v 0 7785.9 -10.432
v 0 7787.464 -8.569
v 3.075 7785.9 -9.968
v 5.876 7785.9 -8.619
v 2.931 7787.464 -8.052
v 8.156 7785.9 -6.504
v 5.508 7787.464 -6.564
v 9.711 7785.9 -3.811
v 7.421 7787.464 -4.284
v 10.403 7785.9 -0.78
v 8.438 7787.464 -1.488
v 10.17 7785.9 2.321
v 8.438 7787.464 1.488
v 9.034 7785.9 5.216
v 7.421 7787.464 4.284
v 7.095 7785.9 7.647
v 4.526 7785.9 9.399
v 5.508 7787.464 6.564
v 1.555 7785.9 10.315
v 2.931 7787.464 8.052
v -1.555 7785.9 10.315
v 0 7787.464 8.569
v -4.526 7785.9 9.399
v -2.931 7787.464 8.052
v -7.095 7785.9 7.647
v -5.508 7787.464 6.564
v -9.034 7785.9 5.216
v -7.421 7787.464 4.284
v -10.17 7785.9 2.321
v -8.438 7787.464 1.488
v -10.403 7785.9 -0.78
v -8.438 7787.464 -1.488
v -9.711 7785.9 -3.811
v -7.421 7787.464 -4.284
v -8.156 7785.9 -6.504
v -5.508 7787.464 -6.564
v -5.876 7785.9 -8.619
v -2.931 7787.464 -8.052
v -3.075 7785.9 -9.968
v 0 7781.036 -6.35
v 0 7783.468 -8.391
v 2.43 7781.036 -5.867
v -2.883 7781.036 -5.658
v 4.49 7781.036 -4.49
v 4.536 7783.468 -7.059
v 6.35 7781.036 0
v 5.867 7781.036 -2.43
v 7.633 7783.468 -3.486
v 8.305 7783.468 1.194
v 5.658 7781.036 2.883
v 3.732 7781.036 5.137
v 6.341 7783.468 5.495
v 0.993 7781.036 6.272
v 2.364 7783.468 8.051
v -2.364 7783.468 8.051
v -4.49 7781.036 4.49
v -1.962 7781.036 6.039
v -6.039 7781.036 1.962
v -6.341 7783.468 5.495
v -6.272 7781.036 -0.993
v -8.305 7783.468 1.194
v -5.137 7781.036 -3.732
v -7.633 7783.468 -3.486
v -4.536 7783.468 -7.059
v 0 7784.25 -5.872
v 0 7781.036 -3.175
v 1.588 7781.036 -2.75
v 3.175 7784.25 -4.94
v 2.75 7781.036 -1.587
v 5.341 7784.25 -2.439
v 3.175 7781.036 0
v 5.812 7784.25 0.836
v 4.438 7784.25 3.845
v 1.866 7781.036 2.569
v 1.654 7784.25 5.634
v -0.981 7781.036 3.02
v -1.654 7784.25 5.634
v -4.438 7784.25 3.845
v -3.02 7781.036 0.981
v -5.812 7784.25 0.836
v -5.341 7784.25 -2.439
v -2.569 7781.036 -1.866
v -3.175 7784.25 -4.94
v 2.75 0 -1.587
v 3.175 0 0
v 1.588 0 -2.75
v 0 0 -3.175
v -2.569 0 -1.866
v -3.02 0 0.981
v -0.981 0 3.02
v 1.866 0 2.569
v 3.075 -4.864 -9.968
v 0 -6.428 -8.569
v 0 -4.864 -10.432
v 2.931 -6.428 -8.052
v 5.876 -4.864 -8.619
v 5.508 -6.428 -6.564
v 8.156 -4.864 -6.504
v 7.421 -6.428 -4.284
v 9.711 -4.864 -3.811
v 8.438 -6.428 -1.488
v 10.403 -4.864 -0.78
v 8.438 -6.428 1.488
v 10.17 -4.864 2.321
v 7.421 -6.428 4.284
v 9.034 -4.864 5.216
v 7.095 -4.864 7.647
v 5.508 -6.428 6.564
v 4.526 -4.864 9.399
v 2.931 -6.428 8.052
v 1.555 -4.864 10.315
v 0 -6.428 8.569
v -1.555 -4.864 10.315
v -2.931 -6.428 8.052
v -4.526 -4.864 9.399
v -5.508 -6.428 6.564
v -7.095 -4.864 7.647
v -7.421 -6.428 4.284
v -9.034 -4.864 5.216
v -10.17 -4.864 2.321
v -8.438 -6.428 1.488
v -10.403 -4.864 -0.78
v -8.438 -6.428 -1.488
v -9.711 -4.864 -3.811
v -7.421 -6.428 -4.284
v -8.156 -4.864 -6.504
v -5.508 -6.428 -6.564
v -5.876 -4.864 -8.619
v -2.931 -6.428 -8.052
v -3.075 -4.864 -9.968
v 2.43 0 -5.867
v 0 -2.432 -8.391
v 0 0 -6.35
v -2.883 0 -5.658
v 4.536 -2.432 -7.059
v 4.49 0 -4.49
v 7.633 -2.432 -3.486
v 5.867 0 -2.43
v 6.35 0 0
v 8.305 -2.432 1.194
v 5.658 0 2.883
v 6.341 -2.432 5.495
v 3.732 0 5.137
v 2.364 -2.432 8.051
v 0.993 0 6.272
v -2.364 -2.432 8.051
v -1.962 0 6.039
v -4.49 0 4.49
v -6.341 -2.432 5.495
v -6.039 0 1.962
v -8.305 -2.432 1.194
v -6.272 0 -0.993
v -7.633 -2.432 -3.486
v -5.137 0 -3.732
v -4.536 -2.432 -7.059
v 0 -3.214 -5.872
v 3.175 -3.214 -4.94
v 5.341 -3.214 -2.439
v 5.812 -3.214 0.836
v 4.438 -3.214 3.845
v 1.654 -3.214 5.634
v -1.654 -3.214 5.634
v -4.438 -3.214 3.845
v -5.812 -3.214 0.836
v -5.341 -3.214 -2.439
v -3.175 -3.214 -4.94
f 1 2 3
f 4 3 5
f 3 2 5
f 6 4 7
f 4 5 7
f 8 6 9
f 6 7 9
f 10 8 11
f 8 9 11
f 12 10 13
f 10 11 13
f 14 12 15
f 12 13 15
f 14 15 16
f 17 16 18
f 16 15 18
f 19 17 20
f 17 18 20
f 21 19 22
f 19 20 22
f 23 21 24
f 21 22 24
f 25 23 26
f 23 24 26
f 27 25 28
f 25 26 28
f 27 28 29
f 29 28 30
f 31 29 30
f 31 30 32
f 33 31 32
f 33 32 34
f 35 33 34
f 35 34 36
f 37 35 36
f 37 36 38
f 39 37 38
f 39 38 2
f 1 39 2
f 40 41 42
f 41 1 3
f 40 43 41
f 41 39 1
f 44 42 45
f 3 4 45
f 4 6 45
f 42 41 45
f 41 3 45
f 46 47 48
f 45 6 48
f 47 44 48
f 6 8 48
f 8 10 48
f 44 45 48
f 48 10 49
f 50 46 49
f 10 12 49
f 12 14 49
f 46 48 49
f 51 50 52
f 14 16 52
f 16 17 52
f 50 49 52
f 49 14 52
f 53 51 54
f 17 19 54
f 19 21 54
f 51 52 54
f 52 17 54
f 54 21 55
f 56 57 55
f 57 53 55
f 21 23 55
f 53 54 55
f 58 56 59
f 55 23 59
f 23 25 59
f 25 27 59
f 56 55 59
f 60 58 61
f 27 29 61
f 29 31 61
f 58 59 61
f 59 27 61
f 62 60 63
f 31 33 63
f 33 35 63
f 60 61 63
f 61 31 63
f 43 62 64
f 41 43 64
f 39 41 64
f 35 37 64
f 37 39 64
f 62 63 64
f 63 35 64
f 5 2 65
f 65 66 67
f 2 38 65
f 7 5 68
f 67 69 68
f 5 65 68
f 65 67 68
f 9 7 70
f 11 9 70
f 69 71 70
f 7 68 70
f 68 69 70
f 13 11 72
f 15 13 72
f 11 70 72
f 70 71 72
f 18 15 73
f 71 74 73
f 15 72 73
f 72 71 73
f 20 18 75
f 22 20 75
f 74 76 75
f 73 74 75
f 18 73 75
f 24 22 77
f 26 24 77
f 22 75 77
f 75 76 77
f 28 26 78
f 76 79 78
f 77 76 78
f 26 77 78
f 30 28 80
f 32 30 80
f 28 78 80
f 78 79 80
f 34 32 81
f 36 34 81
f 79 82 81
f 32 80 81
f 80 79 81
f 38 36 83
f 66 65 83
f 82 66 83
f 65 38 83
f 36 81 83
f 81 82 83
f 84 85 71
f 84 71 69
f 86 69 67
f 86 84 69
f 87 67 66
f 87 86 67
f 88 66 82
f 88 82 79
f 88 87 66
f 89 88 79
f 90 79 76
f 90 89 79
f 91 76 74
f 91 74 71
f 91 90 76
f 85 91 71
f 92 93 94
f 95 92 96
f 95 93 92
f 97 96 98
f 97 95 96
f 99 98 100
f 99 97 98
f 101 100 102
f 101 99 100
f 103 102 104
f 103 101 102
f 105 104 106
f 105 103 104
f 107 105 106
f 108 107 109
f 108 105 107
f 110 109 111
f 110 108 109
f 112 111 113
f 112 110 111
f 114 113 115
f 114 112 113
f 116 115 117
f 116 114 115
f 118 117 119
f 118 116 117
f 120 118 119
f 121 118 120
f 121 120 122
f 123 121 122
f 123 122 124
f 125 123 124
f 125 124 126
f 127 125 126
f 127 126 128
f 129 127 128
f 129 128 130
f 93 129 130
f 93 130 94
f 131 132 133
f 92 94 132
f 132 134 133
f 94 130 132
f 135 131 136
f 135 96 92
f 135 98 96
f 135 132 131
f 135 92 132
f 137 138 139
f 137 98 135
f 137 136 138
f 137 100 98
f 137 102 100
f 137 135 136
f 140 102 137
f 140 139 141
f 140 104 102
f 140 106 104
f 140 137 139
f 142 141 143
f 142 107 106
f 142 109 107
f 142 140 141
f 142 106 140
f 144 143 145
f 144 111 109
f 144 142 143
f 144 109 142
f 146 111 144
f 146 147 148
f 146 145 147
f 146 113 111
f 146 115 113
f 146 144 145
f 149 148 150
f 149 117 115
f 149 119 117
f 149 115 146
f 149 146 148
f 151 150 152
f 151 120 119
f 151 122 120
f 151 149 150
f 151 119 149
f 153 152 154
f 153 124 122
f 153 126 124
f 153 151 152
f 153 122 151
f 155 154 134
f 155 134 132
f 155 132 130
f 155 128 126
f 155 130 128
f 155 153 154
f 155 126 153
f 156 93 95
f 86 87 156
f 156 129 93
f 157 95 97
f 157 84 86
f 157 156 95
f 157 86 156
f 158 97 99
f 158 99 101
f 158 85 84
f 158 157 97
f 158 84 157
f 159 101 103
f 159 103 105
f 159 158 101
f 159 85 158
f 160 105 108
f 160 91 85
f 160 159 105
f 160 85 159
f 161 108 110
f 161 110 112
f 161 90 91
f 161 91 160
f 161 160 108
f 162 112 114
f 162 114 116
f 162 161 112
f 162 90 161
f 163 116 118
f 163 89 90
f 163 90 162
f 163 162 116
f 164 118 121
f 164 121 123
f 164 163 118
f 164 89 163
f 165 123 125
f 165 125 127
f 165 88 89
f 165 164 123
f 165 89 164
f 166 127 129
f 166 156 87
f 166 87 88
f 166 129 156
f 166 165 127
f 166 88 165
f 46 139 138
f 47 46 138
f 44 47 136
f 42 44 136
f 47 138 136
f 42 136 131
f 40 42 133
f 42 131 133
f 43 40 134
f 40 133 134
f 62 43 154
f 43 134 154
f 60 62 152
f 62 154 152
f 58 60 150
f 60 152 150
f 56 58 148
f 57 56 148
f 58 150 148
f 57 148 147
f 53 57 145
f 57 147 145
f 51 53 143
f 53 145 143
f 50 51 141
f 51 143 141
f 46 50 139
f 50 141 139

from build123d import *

# Parameters (mm, degrees)
SKETCH1_R           = 6.35
SKETCH1_R_2         = 3.175
BOSS_EXTRUDE1_DEPTH = 7781.036


with BuildPart() as part:
    # Sketch1 → Boss-Extrude1 (new body)
    with BuildSketch(Plane(origin=(0, 0, 0), x_dir=(1, 0, 0), z_dir=(0, 1, 0))):
        Circle(SKETCH1_R)
        Circle(SKETCH1_R_2, mode=Mode.SUBTRACT)
    extrude(amount=BOSS_EXTRUDE1_DEPTH)

    # Sketch2 → Revolve1 (revolve)
    with BuildSketch(Plane(origin=(0, 0, 0), x_dir=(0, 0, -1), z_dir=(1, 0, 0))):
        Polygon((6.35, 7781.036), (10.431701322, 7785.900382214), (8.568534839, 7787.463764522), (3.175, 7781.036), align=None)
    revolve1 = revolve(axis=Axis((0, 8176.570252748, 0), (0, -1, 0)))

    # Mirror1: Revolve1 across plane
    add(revolve1.mirror(Plane.ZX.offset(3890.518)))


solid = part.part
